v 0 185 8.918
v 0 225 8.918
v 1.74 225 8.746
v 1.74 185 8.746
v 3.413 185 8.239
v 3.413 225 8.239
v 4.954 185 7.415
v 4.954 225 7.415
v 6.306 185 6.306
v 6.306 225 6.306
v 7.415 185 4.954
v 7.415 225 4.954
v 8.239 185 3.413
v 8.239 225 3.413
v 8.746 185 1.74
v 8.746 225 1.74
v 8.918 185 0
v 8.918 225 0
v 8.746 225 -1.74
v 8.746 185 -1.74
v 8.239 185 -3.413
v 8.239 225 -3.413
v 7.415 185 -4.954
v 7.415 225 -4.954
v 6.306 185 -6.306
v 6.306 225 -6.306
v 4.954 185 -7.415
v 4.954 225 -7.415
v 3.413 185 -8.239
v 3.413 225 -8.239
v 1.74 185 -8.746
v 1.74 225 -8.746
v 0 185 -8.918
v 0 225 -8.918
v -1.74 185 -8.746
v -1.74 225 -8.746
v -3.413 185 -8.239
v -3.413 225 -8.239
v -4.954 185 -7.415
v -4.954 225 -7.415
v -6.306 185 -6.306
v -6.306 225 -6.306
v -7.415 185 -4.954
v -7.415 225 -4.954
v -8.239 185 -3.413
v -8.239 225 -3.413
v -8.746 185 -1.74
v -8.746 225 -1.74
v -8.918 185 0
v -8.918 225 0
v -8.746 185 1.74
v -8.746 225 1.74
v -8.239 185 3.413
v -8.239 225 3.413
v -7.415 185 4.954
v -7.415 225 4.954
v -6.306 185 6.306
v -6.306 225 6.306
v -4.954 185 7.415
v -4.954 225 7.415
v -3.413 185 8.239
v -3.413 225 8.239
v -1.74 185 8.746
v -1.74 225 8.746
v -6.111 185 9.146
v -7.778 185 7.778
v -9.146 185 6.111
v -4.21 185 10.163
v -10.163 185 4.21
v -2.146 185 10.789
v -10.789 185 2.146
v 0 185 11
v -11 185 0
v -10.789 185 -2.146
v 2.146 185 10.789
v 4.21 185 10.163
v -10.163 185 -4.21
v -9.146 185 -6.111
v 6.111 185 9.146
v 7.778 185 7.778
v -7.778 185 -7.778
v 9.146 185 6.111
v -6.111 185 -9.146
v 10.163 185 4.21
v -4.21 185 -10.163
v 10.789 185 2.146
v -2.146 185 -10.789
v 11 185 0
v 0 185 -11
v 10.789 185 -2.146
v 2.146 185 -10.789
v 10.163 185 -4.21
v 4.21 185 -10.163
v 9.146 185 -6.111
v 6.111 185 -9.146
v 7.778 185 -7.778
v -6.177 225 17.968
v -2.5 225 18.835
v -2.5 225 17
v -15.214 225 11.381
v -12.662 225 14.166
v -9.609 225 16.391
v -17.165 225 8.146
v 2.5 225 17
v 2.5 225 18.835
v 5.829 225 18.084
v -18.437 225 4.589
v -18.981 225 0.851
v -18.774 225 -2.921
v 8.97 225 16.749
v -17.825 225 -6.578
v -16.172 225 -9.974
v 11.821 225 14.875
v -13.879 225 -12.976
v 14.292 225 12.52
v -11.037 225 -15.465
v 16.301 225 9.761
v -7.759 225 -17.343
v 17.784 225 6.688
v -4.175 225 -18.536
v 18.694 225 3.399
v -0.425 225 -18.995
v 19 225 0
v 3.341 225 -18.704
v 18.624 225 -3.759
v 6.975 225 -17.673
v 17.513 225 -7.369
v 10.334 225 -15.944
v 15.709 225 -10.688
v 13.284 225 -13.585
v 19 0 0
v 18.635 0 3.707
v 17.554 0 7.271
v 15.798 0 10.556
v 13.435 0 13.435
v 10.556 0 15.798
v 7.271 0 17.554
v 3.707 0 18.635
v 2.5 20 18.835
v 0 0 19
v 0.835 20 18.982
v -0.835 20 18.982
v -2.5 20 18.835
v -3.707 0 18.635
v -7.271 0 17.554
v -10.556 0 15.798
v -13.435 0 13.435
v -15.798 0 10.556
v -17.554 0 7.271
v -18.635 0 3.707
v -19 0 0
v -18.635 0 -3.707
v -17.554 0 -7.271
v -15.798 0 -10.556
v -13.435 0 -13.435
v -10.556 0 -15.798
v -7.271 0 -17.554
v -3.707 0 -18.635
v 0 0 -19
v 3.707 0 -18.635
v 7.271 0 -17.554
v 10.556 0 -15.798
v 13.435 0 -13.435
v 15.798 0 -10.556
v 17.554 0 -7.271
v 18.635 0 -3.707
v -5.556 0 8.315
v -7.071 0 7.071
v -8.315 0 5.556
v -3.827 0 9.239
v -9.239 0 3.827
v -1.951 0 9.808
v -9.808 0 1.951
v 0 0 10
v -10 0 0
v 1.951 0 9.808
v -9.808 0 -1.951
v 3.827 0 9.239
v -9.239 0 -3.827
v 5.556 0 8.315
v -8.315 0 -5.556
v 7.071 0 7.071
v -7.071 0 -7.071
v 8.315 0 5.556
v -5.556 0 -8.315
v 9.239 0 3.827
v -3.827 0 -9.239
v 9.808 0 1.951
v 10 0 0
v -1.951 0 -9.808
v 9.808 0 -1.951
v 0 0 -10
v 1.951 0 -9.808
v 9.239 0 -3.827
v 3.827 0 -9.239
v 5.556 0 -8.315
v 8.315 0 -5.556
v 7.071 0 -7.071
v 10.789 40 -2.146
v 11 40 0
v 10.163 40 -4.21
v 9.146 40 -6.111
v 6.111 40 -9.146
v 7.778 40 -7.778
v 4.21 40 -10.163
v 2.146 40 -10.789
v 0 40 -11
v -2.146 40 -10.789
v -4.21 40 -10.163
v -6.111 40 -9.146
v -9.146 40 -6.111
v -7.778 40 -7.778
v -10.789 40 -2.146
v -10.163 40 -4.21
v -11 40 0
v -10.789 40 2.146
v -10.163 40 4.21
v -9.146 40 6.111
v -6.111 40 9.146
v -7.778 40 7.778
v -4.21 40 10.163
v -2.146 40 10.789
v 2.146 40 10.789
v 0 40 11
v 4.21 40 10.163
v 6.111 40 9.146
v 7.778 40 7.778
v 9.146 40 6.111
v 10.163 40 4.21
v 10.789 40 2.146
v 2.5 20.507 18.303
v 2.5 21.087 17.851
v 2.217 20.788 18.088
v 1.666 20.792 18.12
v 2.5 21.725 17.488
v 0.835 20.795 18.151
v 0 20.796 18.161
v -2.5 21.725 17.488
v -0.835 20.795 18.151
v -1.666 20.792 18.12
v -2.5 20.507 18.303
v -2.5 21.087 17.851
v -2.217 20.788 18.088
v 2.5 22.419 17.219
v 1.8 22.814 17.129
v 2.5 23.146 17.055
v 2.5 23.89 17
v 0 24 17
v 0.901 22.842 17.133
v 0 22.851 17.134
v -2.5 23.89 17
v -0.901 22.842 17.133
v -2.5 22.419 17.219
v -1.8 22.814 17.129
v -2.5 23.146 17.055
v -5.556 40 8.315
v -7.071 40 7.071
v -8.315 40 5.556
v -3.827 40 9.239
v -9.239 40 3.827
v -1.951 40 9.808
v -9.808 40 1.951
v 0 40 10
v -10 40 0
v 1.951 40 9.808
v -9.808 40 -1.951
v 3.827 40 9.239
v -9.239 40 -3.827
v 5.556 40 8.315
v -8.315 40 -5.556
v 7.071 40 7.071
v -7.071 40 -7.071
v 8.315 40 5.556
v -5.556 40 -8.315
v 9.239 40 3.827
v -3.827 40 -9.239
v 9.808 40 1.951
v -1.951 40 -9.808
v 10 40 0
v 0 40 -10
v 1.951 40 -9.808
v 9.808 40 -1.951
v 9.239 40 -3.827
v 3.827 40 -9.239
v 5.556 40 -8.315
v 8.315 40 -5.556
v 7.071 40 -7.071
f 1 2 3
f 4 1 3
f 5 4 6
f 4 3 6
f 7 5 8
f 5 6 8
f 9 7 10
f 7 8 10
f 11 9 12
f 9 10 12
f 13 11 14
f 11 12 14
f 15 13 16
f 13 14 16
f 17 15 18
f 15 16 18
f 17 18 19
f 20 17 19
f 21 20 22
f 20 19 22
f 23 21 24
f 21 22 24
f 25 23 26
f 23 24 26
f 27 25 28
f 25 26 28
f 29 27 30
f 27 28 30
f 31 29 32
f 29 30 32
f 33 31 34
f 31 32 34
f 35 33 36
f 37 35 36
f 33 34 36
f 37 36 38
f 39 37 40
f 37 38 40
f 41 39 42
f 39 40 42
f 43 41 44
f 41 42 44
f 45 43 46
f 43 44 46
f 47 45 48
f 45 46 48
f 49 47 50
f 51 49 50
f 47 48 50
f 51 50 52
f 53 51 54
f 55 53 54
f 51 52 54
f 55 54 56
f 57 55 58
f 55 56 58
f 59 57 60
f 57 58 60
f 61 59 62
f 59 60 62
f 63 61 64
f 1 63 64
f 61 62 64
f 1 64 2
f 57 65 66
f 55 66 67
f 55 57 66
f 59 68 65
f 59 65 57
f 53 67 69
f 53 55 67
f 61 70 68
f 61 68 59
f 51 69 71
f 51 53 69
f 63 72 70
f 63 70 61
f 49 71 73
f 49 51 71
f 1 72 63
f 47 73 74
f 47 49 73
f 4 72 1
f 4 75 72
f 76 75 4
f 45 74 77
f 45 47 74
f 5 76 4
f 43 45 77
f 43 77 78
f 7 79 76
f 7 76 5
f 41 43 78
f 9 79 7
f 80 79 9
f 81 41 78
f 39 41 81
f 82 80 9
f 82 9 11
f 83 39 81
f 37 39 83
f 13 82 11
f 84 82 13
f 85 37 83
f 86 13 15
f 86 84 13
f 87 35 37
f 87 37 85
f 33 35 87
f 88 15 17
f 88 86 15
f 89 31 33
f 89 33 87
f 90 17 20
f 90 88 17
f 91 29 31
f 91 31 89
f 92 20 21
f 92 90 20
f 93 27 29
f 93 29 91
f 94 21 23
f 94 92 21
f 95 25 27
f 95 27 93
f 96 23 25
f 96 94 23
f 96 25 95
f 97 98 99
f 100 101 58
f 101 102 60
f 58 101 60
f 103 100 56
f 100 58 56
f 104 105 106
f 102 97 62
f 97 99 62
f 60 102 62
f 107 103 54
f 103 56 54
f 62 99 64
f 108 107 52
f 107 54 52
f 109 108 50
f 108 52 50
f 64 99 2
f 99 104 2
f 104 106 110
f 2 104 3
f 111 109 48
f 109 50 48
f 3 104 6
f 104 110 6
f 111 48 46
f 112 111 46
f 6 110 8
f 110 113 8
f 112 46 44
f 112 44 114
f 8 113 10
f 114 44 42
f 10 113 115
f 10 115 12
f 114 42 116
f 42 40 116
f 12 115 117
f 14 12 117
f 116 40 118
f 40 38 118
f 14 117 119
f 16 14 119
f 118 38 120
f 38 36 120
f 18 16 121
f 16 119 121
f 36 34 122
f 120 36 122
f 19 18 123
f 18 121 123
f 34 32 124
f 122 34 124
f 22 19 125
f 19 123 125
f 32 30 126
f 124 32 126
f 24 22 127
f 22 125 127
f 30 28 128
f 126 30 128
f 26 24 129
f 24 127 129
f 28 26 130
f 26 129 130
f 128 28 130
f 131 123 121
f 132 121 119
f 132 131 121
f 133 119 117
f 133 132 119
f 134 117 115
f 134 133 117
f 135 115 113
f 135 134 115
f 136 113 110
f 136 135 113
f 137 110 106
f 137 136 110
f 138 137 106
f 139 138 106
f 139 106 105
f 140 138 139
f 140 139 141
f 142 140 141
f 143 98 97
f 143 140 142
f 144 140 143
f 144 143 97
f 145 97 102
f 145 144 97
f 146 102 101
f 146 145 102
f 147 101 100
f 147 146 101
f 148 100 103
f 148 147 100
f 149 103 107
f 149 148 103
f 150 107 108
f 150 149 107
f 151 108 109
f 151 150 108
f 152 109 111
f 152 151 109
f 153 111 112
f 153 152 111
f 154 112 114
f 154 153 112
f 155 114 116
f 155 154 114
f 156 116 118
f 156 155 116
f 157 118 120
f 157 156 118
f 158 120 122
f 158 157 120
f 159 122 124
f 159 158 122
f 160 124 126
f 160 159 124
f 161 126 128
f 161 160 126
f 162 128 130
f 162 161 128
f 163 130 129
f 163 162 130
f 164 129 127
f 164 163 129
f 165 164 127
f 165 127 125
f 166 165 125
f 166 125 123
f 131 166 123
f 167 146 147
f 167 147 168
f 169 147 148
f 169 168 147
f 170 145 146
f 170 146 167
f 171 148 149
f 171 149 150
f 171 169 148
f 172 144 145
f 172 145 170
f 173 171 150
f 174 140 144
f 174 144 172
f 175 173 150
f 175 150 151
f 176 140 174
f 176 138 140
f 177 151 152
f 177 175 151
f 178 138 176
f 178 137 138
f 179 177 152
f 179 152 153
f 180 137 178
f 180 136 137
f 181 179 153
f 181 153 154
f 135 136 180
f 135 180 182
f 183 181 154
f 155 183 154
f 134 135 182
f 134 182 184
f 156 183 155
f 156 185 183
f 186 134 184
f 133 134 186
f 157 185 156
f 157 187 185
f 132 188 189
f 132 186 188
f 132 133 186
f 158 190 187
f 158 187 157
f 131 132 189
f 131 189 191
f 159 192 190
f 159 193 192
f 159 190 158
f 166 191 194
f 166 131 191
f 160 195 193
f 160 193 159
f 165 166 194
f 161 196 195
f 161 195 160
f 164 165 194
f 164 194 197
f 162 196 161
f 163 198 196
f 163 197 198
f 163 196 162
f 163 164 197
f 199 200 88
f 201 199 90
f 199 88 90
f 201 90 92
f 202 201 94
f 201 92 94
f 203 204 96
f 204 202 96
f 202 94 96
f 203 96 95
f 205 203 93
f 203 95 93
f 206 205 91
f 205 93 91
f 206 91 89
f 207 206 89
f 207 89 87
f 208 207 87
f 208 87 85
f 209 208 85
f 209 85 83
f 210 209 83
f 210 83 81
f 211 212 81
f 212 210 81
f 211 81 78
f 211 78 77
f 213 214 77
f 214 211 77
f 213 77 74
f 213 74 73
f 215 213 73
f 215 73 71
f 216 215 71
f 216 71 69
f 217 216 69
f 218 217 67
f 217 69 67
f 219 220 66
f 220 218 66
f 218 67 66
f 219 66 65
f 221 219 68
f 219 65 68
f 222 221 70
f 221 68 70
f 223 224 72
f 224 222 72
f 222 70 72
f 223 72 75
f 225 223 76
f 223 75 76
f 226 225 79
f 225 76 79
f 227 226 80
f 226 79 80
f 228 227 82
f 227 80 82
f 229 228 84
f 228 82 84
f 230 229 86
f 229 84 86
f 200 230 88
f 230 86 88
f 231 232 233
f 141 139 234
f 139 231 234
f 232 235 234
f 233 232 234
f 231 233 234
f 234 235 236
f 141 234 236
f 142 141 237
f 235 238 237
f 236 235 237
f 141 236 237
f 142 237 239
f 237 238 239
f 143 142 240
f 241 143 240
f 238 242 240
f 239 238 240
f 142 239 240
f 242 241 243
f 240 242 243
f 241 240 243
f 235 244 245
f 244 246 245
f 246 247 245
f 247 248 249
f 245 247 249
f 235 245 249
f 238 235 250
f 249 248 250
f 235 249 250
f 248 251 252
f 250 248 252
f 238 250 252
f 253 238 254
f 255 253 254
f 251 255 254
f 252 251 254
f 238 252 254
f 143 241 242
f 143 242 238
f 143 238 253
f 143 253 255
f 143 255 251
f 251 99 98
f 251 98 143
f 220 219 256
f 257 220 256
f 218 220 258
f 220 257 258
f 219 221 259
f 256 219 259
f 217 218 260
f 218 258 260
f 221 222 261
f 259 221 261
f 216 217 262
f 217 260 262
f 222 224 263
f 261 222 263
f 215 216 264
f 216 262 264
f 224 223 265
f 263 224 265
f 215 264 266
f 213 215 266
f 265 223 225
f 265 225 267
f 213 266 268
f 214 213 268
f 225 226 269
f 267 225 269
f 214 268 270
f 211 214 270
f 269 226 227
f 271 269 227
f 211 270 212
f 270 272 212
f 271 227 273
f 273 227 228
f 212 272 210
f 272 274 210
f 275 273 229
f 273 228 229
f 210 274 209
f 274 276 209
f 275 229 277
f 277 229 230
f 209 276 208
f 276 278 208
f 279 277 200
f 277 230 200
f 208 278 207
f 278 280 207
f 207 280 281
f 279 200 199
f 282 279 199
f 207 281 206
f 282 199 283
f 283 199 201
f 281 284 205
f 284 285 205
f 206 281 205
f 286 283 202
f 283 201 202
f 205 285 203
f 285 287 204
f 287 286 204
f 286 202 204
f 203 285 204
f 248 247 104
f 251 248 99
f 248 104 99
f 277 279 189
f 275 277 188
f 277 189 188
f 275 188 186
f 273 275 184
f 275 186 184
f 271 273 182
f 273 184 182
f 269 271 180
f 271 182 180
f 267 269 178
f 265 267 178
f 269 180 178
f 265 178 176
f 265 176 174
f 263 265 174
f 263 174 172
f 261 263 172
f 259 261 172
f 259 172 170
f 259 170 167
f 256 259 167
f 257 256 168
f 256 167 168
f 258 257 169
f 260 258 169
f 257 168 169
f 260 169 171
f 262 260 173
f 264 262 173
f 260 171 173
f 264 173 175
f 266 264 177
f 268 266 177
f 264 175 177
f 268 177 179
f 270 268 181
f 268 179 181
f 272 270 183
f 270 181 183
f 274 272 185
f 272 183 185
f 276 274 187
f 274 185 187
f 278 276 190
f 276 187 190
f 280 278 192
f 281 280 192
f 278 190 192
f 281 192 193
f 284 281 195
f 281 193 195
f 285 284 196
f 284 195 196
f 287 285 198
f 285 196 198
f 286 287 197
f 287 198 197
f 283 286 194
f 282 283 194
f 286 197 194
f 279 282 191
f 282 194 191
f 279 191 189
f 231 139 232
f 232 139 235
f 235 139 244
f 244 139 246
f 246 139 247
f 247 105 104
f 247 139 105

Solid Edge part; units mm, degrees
sketch "Sketch1" plane through (0, 0, 0) normal (0, -1, 0) x (1, 0, 0)
  circle A0 centre (0, 0) radius 19
  dimension "D1" = 38
extrude "Protrusion1" add sketch "Sketch1" against normal blind 225
sketch "Sketch2" plane through (0, 0, 0) normal (0, -1, 0) x (1, 0, 0)
  circle A0 centre (0, 0) radius 10
extrude "ExtrudedCutout_1" cut sketch "Sketch2" against normal blind 40
sketch "Sketch3" plane through (0, 112.5, 0) normal (0, -1, 0) x (1, 0, 0)
  circle A0 centre (0, 0) radius 11
extrude "ExtrudedCutout_3" cut sketch "Sketch3" along normal mid plane 145
hole "Hole_1" at (0, 225, 0) direction (0, -1, 0) diameter 17.835 end up to next thread major 20 thread length 45
sketch "Sketch4" plane through (0, 225, 0) normal (0, 1, 0) x (1, 0, 0)
  line L0 (-2.5, -20) -> (2.5, -20)
  line L1 (2.5, -20) -> (2.5, -17)
  line L2 (2.5, -17) -> (-2.5, -17)
  line L3 (-2.5, -17) -> (-2.5, -20)
extrude "ExtrudedCutout_5" cut sketch "Sketch4" against normal blind 205
fillet "Round_2" radius 5 1 edges at (0, 20, 17)
